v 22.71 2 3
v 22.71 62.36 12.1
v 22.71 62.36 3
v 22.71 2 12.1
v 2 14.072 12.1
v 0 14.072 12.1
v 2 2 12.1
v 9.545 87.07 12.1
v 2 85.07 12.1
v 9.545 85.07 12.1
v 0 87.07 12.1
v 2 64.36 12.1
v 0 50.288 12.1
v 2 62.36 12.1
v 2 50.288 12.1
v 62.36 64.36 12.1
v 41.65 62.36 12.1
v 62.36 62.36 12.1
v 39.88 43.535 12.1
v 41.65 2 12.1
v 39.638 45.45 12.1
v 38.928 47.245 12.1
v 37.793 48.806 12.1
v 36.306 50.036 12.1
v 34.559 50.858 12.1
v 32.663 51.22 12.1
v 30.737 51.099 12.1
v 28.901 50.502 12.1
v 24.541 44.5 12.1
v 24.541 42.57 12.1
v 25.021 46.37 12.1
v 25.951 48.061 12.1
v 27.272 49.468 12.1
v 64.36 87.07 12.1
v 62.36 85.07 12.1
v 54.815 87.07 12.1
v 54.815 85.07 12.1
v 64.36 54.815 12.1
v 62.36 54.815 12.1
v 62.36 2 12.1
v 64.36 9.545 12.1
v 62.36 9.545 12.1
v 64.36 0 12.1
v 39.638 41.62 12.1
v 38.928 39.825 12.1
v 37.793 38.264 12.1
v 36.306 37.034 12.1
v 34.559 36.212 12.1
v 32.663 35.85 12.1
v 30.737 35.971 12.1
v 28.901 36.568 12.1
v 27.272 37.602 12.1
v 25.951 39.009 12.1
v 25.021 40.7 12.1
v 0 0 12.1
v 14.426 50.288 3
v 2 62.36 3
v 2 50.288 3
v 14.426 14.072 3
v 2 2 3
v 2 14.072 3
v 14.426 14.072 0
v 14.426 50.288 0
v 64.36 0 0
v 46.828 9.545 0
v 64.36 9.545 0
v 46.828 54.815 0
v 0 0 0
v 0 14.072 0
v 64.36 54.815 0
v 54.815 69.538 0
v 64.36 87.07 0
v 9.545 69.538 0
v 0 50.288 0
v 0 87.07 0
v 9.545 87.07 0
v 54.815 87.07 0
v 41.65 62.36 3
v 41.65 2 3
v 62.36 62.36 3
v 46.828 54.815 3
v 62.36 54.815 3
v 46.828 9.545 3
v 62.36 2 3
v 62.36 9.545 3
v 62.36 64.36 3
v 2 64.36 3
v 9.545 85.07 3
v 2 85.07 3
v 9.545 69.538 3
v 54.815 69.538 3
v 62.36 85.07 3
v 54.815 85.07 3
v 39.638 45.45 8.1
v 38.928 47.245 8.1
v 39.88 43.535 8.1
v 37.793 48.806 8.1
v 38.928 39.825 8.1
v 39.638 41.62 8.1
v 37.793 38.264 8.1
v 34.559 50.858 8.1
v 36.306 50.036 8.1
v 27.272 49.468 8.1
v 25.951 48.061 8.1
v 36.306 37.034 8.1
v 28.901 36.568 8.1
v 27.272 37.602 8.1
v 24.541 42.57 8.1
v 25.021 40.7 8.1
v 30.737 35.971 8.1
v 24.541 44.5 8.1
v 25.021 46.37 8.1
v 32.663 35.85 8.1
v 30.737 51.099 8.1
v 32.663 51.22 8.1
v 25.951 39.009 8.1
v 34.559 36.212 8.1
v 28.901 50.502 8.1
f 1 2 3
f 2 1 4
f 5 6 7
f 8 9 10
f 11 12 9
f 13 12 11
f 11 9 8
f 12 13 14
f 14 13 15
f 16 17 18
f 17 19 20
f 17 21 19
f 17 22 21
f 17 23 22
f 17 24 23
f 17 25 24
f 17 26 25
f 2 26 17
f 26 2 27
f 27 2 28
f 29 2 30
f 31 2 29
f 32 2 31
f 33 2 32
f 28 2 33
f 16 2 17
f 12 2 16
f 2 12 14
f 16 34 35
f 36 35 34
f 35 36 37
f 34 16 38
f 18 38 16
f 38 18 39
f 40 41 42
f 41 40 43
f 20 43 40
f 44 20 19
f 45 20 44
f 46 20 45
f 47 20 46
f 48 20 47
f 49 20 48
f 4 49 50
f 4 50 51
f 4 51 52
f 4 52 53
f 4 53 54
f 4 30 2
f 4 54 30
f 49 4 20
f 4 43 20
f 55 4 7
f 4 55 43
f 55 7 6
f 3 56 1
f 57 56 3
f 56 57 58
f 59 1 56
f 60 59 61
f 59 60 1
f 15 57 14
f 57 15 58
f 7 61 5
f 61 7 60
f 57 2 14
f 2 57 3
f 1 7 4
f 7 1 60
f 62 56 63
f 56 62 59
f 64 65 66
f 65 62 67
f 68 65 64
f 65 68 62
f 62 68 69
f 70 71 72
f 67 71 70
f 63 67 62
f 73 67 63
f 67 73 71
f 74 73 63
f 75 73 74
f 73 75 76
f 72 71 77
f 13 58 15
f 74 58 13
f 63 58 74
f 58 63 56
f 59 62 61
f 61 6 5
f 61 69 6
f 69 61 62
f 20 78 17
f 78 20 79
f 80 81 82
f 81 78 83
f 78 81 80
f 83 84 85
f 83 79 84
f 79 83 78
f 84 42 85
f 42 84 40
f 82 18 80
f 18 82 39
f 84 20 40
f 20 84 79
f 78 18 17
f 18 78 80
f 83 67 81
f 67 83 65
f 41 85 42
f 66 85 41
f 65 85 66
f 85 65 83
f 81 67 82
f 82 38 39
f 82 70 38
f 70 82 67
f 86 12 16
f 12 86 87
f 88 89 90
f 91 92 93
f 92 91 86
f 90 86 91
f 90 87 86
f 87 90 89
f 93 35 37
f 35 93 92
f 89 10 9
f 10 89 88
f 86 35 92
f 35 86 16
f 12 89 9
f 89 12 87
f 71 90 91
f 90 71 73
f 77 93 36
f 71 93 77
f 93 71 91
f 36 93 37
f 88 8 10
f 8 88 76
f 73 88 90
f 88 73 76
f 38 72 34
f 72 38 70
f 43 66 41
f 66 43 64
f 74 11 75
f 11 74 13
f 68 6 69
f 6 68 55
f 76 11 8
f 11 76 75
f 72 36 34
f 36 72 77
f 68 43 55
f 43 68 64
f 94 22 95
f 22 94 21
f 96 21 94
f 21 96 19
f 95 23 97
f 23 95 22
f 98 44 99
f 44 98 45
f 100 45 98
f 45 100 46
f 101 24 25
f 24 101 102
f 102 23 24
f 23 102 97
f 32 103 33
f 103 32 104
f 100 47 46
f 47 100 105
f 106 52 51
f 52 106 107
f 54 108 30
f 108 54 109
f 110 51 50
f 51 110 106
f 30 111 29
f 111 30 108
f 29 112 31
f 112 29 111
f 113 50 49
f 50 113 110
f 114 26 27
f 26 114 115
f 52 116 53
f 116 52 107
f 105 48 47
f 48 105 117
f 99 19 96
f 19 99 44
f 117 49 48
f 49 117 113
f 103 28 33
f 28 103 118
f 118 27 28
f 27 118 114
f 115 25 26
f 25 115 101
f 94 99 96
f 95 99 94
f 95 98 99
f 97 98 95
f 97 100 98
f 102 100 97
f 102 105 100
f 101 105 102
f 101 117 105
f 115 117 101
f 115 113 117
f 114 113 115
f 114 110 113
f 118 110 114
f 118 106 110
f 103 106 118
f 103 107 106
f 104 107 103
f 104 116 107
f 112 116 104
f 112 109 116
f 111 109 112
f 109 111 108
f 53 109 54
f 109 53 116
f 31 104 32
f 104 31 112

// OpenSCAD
// file: SquarePileLib.scad
module LeftPile(wallThickness, totalHeight, singlePileHeight, singlePileWidth, singlePileLength, pileCount, openingSizePercent = .75){
    pileHeight = (pileCount * singlePileHeight) + .5;
    lengthOpeningSize = singlePileLength * openingSizePercent;
    widthOpeningSize = singlePileWidth * openingSizePercent;
    blockerSize = (singlePileWidth - widthOpeningSize) / 2;
    
    translate([wallThickness, wallThickness, totalHeight - pileHeight])
        cube([singlePileLength, singlePileWidth, pileHeight]);
    translate([-.00001, wallThickness + (blockerSize), 0])
        cube([wallThickness + lengthOpeningSize, widthOpeningSize, totalHeight]);
}

module RightPile(wallThickness, totalHeight, singlePileHeight, singlePileWidth, singlePileLength, pileCount, openingSizePercent = .75){
    translate([0, wallThickness + wallThickness + singlePileWidth, 0])
        rotate([0, 0, 180])
            LeftPile(wallThickness, totalHeight, singlePileHeight, singlePileWidth, singlePileLength, pileCount);
}

module BottomPile(wallThickness, totalHeight, singlePileHeight, singlePileWidth, singlePileLength, pileCount, openingSizePercent = .75){
    translate([wallThickness + wallThickness + singlePileWidth, 0, 0])
        rotate([0, 0, 90])
            LeftPile(wallThickness, totalHeight, singlePileHeight, singlePileWidth, singlePileLength, pileCount);
}

module TopPile(wallThickness, totalHeight, singlePileHeight, singlePileWidth, singlePileLength, pileCount, openingSizePercent = .75){
        rotate([0, 0, 270])
            LeftPile(wallThickness, totalHeight, singlePileHeight, singlePileWidth, singlePileLength, pileCount);
}
// file: ColonistsWarehouseExtensionLib.scad
include<SquarePileLib.scad>
//25.82 by 32.82 by 2.15
singleWarehouseExtensionPileHeight = 2.15;
singleWarehouseExtensionPileWidth = 59.86 + .5;
singleWarehouseExtensionPileLength = 20.21 + .5;

module LeftWarehouseExtensionPile(wallThickness, totalHeight, warehouseExtensionPileCount){
    LeftPile(
        wallThickness,
        totalHeight,
        singleWarehouseExtensionPileHeight,
        singleWarehouseExtensionPileWidth,
        singleWarehouseExtensionPileLength,
        warehouseExtensionPileCount,
        .6);
}

module RightWarehouseExtensionPile(wallThickness, totalHeight, warehouseExtensionPileCount){
    RightPile(
        wallThickness,
        totalHeight,
        singleWarehouseExtensionPileHeight,
        singleWarehouseExtensionPileWidth,
        singleWarehouseExtensionPileLength,
        warehouseExtensionPileCount,
        .6);
}

module BottomWarehouseExtensionPile(wallThickness, totalHeight, warehouseExtensionPileCount){
    BottomPile(
        wallThickness,
        totalHeight,
        singleWarehouseExtensionPileHeight,
        singleWarehouseExtensionPileWidth,
        singleWarehouseExtensionPileLength,
        warehouseExtensionPileCount,
        .6);
}

module TopWarehouseExtensionPile(wallThickness, totalHeight, warehouseExtensionPileCount){
    TopPile(
        wallThickness,
        totalHeight,
        singleWarehouseExtensionPileHeight,
        singleWarehouseExtensionPileWidth,
        singleWarehouseExtensionPileLength,
        warehouseExtensionPileCount,
        .6);
}

function warehouseExtensionPileHeight(warehouseExtensionPileCount) =
    (warehouseExtensionPileCount * singleWarehouseExtensionPileHeight) + .5;
// main file
include<ColonistsWarehouseExtensionLib.scad>
wallThickness = 2;
floorHeight = 3;
tileCount = 4;
magnetBaseInnerDiameter = 15.4;
magnetHeight = 4.0;
height = warehouseExtensionPileHeight(tileCount) + floorHeight;
length = singleWarehouseExtensionPileWidth + wallThickness * 2;
echo(length);
width = singleWarehouseExtensionPileWidth + singleWarehouseExtensionPileLength + wallThickness * 3;
echo(width);

difference() {
    
    cube([length, width, height]);
    translate([0, 0, 0])
        LeftWarehouseExtensionPile(wallThickness, height, tileCount);
    translate([length, 0, 0])
        RightWarehouseExtensionPile(wallThickness, height, tileCount);
    
    translate([0, width, 0])
        TopWarehouseExtensionPile(wallThickness, height, tileCount);
    
   
    translate([length/2, width/2, height - magnetHeight])
        cylinder(magnetHeight, d=magnetBaseInnerDiameter);
}
